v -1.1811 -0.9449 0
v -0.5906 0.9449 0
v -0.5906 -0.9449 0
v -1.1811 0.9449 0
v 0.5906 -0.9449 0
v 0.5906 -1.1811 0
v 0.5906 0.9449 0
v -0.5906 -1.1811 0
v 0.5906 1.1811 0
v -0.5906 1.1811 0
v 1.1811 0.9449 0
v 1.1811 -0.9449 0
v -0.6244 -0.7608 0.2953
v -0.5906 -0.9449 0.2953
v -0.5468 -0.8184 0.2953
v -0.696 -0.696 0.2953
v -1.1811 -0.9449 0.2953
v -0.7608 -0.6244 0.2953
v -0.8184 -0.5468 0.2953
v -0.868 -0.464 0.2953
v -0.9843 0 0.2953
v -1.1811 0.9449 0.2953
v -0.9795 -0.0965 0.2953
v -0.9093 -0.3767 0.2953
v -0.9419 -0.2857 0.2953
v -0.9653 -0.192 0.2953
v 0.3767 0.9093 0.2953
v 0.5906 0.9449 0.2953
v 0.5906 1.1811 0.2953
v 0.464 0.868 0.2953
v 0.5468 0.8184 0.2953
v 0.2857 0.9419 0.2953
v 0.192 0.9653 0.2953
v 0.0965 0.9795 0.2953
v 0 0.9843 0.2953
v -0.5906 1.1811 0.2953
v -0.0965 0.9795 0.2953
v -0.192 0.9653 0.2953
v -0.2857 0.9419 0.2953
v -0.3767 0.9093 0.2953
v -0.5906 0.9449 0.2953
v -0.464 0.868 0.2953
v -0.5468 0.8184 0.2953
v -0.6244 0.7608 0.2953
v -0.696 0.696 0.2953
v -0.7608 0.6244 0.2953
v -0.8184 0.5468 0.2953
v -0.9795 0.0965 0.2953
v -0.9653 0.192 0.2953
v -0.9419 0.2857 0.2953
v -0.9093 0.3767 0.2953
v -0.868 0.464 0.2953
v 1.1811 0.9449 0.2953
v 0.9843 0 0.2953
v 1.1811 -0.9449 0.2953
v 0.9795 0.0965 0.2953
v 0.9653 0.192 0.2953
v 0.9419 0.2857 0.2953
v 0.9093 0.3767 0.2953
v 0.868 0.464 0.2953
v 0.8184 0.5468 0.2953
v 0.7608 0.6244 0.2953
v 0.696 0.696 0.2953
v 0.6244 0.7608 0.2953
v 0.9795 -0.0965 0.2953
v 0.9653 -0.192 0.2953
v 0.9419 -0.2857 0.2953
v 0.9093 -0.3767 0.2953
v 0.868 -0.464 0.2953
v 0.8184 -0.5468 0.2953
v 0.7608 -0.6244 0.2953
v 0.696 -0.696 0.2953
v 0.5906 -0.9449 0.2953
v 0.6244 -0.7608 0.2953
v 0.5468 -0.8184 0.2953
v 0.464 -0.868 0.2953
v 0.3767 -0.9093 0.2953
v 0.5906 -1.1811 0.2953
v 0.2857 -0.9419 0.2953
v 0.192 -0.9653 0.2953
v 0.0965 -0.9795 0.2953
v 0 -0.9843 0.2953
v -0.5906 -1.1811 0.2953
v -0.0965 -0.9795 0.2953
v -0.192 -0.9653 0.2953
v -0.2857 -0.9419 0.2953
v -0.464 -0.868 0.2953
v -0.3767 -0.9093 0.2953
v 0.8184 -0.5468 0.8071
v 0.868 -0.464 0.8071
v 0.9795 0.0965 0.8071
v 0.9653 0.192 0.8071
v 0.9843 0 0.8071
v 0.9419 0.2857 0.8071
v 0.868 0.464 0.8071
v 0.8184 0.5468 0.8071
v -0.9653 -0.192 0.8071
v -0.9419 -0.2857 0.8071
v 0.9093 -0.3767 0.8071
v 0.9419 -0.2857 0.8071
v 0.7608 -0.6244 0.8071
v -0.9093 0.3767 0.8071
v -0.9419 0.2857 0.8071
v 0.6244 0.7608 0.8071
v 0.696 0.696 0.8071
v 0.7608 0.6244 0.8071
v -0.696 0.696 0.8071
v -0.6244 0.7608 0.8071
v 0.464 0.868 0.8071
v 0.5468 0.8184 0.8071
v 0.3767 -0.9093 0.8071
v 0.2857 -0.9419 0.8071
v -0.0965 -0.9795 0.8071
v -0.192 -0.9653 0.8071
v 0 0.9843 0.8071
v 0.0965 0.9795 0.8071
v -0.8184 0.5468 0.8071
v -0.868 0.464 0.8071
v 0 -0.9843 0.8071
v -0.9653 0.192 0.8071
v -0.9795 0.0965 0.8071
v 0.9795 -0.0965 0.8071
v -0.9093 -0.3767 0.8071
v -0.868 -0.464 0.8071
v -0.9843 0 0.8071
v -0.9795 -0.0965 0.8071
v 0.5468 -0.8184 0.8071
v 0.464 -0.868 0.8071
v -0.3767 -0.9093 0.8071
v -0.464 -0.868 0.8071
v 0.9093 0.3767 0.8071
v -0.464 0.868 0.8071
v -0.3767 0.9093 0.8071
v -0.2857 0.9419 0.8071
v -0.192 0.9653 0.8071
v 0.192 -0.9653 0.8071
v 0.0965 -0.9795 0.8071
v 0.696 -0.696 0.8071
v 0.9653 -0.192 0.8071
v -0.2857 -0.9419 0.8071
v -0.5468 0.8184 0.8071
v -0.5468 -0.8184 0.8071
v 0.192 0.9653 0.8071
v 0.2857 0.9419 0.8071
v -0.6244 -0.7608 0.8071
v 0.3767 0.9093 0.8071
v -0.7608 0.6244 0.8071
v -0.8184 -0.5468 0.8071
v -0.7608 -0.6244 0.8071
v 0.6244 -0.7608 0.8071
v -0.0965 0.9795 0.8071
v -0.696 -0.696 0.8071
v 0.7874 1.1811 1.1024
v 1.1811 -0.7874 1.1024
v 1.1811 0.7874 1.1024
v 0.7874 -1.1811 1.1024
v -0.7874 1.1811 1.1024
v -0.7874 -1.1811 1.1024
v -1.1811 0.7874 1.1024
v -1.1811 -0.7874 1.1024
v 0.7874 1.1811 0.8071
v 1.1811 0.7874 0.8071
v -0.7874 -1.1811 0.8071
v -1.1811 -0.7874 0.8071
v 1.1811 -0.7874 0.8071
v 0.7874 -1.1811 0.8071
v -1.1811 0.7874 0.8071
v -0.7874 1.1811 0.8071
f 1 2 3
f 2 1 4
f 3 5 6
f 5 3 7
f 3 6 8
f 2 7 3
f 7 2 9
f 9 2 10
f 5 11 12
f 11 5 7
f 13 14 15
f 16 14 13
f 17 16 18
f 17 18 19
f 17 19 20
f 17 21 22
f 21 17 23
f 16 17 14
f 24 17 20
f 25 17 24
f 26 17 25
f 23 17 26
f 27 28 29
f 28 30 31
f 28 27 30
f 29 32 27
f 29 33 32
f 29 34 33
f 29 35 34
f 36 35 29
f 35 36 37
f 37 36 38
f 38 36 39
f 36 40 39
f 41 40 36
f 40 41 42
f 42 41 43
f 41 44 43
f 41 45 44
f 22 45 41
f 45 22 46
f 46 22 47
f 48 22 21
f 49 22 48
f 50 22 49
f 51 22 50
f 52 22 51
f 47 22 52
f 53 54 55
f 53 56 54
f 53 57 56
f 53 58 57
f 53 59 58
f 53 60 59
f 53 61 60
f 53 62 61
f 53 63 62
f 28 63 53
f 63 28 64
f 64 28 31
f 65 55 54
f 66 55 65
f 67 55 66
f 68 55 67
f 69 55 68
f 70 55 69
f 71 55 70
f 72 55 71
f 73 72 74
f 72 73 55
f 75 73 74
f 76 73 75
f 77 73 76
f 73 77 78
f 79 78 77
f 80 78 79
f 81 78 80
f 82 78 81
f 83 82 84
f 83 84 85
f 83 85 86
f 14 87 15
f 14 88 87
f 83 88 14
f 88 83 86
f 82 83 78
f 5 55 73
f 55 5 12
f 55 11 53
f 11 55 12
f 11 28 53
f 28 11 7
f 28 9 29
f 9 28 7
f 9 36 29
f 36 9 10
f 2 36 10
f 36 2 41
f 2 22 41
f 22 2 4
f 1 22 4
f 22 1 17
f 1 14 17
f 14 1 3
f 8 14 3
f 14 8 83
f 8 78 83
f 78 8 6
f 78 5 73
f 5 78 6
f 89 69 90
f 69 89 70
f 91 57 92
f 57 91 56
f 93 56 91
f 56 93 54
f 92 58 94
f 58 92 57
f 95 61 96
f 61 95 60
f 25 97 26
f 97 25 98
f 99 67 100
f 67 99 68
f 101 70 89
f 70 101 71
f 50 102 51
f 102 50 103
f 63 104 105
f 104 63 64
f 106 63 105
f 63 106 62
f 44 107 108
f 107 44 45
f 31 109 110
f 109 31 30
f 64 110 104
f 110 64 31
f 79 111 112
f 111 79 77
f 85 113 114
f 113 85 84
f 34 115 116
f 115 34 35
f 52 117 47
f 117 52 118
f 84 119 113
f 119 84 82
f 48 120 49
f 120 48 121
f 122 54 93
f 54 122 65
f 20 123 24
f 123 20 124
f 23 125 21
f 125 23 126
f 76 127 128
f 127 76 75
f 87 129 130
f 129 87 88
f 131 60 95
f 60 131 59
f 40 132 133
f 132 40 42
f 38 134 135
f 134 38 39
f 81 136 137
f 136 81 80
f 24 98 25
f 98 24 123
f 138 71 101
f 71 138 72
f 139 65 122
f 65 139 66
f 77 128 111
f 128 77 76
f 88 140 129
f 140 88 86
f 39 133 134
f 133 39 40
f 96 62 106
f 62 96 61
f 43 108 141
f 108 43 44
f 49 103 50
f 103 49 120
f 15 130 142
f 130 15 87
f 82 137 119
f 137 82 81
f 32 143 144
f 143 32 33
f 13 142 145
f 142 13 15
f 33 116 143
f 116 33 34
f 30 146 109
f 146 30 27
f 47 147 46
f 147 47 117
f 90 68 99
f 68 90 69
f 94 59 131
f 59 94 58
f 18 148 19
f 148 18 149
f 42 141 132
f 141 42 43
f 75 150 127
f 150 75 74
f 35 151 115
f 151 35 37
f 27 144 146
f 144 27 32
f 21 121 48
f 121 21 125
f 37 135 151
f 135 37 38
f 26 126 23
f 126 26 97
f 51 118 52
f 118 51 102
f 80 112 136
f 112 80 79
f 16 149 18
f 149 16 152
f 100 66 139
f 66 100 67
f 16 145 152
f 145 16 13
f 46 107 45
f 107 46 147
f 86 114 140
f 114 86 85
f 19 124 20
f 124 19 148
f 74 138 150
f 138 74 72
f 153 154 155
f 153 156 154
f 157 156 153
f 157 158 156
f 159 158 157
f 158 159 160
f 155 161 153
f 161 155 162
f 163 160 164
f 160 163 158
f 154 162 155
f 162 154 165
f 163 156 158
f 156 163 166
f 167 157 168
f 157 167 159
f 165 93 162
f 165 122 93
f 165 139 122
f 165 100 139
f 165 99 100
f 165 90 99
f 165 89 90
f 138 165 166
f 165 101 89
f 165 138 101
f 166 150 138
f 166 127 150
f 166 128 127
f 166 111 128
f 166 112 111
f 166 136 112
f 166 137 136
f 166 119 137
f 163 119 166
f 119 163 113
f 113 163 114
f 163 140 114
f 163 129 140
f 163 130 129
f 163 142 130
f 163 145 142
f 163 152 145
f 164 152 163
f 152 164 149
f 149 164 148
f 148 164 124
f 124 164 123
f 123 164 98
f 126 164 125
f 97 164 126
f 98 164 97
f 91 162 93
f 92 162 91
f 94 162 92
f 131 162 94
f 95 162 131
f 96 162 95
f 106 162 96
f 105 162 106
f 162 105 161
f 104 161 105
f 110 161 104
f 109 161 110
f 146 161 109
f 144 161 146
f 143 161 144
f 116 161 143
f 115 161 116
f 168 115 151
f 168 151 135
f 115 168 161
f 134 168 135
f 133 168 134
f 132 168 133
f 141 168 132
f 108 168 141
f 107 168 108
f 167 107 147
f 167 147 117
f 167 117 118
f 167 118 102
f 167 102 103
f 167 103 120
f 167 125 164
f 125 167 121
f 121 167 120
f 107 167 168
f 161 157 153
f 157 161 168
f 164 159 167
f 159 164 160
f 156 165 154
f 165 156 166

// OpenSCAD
// file: defines.scad
// example012.stl is Mblock.stl, (c) 2009 Will Langford
// licensed under the Creative Commons - GNU GPL license.
// http://www.thingiverse.com/thing:753

//import("sim800c.stl", convexity=3);

// PCB

L = 6.0;
W = 6.0;
H = 2.8;
e = 1.35;
pin_fragments = 16;

scale = 1/2.54;
// main file
include <defines.scad>

scale(scale) color("Grey")
union() {
// Base

translate([-L/2, -W/2, 0])
  linear_extrude(height = 0.75, center = false)
    polygon([[0,0.6],[0,5.4],[1.5,5.4],[1.5,6],[4.5,6],[4.5,5.4],[6,5.4],[6,0.6],[4.5,0.6],[4.5,0],[1.5,0],[1.5,0.6]]);

// Body
/*translate([-L/2, -W/2, H-0.75])*/
    cylinder(r = 2.5, h = H, $fn = 64);

// Head
translate([-L/2, -W/2, H-0.75])
  linear_extrude(height = 0.75, center = false)
    polygon([[0,1],[0,5],[1,6],[5,6],[6,5],[6,1],[5,0],[1,0]]);

}
